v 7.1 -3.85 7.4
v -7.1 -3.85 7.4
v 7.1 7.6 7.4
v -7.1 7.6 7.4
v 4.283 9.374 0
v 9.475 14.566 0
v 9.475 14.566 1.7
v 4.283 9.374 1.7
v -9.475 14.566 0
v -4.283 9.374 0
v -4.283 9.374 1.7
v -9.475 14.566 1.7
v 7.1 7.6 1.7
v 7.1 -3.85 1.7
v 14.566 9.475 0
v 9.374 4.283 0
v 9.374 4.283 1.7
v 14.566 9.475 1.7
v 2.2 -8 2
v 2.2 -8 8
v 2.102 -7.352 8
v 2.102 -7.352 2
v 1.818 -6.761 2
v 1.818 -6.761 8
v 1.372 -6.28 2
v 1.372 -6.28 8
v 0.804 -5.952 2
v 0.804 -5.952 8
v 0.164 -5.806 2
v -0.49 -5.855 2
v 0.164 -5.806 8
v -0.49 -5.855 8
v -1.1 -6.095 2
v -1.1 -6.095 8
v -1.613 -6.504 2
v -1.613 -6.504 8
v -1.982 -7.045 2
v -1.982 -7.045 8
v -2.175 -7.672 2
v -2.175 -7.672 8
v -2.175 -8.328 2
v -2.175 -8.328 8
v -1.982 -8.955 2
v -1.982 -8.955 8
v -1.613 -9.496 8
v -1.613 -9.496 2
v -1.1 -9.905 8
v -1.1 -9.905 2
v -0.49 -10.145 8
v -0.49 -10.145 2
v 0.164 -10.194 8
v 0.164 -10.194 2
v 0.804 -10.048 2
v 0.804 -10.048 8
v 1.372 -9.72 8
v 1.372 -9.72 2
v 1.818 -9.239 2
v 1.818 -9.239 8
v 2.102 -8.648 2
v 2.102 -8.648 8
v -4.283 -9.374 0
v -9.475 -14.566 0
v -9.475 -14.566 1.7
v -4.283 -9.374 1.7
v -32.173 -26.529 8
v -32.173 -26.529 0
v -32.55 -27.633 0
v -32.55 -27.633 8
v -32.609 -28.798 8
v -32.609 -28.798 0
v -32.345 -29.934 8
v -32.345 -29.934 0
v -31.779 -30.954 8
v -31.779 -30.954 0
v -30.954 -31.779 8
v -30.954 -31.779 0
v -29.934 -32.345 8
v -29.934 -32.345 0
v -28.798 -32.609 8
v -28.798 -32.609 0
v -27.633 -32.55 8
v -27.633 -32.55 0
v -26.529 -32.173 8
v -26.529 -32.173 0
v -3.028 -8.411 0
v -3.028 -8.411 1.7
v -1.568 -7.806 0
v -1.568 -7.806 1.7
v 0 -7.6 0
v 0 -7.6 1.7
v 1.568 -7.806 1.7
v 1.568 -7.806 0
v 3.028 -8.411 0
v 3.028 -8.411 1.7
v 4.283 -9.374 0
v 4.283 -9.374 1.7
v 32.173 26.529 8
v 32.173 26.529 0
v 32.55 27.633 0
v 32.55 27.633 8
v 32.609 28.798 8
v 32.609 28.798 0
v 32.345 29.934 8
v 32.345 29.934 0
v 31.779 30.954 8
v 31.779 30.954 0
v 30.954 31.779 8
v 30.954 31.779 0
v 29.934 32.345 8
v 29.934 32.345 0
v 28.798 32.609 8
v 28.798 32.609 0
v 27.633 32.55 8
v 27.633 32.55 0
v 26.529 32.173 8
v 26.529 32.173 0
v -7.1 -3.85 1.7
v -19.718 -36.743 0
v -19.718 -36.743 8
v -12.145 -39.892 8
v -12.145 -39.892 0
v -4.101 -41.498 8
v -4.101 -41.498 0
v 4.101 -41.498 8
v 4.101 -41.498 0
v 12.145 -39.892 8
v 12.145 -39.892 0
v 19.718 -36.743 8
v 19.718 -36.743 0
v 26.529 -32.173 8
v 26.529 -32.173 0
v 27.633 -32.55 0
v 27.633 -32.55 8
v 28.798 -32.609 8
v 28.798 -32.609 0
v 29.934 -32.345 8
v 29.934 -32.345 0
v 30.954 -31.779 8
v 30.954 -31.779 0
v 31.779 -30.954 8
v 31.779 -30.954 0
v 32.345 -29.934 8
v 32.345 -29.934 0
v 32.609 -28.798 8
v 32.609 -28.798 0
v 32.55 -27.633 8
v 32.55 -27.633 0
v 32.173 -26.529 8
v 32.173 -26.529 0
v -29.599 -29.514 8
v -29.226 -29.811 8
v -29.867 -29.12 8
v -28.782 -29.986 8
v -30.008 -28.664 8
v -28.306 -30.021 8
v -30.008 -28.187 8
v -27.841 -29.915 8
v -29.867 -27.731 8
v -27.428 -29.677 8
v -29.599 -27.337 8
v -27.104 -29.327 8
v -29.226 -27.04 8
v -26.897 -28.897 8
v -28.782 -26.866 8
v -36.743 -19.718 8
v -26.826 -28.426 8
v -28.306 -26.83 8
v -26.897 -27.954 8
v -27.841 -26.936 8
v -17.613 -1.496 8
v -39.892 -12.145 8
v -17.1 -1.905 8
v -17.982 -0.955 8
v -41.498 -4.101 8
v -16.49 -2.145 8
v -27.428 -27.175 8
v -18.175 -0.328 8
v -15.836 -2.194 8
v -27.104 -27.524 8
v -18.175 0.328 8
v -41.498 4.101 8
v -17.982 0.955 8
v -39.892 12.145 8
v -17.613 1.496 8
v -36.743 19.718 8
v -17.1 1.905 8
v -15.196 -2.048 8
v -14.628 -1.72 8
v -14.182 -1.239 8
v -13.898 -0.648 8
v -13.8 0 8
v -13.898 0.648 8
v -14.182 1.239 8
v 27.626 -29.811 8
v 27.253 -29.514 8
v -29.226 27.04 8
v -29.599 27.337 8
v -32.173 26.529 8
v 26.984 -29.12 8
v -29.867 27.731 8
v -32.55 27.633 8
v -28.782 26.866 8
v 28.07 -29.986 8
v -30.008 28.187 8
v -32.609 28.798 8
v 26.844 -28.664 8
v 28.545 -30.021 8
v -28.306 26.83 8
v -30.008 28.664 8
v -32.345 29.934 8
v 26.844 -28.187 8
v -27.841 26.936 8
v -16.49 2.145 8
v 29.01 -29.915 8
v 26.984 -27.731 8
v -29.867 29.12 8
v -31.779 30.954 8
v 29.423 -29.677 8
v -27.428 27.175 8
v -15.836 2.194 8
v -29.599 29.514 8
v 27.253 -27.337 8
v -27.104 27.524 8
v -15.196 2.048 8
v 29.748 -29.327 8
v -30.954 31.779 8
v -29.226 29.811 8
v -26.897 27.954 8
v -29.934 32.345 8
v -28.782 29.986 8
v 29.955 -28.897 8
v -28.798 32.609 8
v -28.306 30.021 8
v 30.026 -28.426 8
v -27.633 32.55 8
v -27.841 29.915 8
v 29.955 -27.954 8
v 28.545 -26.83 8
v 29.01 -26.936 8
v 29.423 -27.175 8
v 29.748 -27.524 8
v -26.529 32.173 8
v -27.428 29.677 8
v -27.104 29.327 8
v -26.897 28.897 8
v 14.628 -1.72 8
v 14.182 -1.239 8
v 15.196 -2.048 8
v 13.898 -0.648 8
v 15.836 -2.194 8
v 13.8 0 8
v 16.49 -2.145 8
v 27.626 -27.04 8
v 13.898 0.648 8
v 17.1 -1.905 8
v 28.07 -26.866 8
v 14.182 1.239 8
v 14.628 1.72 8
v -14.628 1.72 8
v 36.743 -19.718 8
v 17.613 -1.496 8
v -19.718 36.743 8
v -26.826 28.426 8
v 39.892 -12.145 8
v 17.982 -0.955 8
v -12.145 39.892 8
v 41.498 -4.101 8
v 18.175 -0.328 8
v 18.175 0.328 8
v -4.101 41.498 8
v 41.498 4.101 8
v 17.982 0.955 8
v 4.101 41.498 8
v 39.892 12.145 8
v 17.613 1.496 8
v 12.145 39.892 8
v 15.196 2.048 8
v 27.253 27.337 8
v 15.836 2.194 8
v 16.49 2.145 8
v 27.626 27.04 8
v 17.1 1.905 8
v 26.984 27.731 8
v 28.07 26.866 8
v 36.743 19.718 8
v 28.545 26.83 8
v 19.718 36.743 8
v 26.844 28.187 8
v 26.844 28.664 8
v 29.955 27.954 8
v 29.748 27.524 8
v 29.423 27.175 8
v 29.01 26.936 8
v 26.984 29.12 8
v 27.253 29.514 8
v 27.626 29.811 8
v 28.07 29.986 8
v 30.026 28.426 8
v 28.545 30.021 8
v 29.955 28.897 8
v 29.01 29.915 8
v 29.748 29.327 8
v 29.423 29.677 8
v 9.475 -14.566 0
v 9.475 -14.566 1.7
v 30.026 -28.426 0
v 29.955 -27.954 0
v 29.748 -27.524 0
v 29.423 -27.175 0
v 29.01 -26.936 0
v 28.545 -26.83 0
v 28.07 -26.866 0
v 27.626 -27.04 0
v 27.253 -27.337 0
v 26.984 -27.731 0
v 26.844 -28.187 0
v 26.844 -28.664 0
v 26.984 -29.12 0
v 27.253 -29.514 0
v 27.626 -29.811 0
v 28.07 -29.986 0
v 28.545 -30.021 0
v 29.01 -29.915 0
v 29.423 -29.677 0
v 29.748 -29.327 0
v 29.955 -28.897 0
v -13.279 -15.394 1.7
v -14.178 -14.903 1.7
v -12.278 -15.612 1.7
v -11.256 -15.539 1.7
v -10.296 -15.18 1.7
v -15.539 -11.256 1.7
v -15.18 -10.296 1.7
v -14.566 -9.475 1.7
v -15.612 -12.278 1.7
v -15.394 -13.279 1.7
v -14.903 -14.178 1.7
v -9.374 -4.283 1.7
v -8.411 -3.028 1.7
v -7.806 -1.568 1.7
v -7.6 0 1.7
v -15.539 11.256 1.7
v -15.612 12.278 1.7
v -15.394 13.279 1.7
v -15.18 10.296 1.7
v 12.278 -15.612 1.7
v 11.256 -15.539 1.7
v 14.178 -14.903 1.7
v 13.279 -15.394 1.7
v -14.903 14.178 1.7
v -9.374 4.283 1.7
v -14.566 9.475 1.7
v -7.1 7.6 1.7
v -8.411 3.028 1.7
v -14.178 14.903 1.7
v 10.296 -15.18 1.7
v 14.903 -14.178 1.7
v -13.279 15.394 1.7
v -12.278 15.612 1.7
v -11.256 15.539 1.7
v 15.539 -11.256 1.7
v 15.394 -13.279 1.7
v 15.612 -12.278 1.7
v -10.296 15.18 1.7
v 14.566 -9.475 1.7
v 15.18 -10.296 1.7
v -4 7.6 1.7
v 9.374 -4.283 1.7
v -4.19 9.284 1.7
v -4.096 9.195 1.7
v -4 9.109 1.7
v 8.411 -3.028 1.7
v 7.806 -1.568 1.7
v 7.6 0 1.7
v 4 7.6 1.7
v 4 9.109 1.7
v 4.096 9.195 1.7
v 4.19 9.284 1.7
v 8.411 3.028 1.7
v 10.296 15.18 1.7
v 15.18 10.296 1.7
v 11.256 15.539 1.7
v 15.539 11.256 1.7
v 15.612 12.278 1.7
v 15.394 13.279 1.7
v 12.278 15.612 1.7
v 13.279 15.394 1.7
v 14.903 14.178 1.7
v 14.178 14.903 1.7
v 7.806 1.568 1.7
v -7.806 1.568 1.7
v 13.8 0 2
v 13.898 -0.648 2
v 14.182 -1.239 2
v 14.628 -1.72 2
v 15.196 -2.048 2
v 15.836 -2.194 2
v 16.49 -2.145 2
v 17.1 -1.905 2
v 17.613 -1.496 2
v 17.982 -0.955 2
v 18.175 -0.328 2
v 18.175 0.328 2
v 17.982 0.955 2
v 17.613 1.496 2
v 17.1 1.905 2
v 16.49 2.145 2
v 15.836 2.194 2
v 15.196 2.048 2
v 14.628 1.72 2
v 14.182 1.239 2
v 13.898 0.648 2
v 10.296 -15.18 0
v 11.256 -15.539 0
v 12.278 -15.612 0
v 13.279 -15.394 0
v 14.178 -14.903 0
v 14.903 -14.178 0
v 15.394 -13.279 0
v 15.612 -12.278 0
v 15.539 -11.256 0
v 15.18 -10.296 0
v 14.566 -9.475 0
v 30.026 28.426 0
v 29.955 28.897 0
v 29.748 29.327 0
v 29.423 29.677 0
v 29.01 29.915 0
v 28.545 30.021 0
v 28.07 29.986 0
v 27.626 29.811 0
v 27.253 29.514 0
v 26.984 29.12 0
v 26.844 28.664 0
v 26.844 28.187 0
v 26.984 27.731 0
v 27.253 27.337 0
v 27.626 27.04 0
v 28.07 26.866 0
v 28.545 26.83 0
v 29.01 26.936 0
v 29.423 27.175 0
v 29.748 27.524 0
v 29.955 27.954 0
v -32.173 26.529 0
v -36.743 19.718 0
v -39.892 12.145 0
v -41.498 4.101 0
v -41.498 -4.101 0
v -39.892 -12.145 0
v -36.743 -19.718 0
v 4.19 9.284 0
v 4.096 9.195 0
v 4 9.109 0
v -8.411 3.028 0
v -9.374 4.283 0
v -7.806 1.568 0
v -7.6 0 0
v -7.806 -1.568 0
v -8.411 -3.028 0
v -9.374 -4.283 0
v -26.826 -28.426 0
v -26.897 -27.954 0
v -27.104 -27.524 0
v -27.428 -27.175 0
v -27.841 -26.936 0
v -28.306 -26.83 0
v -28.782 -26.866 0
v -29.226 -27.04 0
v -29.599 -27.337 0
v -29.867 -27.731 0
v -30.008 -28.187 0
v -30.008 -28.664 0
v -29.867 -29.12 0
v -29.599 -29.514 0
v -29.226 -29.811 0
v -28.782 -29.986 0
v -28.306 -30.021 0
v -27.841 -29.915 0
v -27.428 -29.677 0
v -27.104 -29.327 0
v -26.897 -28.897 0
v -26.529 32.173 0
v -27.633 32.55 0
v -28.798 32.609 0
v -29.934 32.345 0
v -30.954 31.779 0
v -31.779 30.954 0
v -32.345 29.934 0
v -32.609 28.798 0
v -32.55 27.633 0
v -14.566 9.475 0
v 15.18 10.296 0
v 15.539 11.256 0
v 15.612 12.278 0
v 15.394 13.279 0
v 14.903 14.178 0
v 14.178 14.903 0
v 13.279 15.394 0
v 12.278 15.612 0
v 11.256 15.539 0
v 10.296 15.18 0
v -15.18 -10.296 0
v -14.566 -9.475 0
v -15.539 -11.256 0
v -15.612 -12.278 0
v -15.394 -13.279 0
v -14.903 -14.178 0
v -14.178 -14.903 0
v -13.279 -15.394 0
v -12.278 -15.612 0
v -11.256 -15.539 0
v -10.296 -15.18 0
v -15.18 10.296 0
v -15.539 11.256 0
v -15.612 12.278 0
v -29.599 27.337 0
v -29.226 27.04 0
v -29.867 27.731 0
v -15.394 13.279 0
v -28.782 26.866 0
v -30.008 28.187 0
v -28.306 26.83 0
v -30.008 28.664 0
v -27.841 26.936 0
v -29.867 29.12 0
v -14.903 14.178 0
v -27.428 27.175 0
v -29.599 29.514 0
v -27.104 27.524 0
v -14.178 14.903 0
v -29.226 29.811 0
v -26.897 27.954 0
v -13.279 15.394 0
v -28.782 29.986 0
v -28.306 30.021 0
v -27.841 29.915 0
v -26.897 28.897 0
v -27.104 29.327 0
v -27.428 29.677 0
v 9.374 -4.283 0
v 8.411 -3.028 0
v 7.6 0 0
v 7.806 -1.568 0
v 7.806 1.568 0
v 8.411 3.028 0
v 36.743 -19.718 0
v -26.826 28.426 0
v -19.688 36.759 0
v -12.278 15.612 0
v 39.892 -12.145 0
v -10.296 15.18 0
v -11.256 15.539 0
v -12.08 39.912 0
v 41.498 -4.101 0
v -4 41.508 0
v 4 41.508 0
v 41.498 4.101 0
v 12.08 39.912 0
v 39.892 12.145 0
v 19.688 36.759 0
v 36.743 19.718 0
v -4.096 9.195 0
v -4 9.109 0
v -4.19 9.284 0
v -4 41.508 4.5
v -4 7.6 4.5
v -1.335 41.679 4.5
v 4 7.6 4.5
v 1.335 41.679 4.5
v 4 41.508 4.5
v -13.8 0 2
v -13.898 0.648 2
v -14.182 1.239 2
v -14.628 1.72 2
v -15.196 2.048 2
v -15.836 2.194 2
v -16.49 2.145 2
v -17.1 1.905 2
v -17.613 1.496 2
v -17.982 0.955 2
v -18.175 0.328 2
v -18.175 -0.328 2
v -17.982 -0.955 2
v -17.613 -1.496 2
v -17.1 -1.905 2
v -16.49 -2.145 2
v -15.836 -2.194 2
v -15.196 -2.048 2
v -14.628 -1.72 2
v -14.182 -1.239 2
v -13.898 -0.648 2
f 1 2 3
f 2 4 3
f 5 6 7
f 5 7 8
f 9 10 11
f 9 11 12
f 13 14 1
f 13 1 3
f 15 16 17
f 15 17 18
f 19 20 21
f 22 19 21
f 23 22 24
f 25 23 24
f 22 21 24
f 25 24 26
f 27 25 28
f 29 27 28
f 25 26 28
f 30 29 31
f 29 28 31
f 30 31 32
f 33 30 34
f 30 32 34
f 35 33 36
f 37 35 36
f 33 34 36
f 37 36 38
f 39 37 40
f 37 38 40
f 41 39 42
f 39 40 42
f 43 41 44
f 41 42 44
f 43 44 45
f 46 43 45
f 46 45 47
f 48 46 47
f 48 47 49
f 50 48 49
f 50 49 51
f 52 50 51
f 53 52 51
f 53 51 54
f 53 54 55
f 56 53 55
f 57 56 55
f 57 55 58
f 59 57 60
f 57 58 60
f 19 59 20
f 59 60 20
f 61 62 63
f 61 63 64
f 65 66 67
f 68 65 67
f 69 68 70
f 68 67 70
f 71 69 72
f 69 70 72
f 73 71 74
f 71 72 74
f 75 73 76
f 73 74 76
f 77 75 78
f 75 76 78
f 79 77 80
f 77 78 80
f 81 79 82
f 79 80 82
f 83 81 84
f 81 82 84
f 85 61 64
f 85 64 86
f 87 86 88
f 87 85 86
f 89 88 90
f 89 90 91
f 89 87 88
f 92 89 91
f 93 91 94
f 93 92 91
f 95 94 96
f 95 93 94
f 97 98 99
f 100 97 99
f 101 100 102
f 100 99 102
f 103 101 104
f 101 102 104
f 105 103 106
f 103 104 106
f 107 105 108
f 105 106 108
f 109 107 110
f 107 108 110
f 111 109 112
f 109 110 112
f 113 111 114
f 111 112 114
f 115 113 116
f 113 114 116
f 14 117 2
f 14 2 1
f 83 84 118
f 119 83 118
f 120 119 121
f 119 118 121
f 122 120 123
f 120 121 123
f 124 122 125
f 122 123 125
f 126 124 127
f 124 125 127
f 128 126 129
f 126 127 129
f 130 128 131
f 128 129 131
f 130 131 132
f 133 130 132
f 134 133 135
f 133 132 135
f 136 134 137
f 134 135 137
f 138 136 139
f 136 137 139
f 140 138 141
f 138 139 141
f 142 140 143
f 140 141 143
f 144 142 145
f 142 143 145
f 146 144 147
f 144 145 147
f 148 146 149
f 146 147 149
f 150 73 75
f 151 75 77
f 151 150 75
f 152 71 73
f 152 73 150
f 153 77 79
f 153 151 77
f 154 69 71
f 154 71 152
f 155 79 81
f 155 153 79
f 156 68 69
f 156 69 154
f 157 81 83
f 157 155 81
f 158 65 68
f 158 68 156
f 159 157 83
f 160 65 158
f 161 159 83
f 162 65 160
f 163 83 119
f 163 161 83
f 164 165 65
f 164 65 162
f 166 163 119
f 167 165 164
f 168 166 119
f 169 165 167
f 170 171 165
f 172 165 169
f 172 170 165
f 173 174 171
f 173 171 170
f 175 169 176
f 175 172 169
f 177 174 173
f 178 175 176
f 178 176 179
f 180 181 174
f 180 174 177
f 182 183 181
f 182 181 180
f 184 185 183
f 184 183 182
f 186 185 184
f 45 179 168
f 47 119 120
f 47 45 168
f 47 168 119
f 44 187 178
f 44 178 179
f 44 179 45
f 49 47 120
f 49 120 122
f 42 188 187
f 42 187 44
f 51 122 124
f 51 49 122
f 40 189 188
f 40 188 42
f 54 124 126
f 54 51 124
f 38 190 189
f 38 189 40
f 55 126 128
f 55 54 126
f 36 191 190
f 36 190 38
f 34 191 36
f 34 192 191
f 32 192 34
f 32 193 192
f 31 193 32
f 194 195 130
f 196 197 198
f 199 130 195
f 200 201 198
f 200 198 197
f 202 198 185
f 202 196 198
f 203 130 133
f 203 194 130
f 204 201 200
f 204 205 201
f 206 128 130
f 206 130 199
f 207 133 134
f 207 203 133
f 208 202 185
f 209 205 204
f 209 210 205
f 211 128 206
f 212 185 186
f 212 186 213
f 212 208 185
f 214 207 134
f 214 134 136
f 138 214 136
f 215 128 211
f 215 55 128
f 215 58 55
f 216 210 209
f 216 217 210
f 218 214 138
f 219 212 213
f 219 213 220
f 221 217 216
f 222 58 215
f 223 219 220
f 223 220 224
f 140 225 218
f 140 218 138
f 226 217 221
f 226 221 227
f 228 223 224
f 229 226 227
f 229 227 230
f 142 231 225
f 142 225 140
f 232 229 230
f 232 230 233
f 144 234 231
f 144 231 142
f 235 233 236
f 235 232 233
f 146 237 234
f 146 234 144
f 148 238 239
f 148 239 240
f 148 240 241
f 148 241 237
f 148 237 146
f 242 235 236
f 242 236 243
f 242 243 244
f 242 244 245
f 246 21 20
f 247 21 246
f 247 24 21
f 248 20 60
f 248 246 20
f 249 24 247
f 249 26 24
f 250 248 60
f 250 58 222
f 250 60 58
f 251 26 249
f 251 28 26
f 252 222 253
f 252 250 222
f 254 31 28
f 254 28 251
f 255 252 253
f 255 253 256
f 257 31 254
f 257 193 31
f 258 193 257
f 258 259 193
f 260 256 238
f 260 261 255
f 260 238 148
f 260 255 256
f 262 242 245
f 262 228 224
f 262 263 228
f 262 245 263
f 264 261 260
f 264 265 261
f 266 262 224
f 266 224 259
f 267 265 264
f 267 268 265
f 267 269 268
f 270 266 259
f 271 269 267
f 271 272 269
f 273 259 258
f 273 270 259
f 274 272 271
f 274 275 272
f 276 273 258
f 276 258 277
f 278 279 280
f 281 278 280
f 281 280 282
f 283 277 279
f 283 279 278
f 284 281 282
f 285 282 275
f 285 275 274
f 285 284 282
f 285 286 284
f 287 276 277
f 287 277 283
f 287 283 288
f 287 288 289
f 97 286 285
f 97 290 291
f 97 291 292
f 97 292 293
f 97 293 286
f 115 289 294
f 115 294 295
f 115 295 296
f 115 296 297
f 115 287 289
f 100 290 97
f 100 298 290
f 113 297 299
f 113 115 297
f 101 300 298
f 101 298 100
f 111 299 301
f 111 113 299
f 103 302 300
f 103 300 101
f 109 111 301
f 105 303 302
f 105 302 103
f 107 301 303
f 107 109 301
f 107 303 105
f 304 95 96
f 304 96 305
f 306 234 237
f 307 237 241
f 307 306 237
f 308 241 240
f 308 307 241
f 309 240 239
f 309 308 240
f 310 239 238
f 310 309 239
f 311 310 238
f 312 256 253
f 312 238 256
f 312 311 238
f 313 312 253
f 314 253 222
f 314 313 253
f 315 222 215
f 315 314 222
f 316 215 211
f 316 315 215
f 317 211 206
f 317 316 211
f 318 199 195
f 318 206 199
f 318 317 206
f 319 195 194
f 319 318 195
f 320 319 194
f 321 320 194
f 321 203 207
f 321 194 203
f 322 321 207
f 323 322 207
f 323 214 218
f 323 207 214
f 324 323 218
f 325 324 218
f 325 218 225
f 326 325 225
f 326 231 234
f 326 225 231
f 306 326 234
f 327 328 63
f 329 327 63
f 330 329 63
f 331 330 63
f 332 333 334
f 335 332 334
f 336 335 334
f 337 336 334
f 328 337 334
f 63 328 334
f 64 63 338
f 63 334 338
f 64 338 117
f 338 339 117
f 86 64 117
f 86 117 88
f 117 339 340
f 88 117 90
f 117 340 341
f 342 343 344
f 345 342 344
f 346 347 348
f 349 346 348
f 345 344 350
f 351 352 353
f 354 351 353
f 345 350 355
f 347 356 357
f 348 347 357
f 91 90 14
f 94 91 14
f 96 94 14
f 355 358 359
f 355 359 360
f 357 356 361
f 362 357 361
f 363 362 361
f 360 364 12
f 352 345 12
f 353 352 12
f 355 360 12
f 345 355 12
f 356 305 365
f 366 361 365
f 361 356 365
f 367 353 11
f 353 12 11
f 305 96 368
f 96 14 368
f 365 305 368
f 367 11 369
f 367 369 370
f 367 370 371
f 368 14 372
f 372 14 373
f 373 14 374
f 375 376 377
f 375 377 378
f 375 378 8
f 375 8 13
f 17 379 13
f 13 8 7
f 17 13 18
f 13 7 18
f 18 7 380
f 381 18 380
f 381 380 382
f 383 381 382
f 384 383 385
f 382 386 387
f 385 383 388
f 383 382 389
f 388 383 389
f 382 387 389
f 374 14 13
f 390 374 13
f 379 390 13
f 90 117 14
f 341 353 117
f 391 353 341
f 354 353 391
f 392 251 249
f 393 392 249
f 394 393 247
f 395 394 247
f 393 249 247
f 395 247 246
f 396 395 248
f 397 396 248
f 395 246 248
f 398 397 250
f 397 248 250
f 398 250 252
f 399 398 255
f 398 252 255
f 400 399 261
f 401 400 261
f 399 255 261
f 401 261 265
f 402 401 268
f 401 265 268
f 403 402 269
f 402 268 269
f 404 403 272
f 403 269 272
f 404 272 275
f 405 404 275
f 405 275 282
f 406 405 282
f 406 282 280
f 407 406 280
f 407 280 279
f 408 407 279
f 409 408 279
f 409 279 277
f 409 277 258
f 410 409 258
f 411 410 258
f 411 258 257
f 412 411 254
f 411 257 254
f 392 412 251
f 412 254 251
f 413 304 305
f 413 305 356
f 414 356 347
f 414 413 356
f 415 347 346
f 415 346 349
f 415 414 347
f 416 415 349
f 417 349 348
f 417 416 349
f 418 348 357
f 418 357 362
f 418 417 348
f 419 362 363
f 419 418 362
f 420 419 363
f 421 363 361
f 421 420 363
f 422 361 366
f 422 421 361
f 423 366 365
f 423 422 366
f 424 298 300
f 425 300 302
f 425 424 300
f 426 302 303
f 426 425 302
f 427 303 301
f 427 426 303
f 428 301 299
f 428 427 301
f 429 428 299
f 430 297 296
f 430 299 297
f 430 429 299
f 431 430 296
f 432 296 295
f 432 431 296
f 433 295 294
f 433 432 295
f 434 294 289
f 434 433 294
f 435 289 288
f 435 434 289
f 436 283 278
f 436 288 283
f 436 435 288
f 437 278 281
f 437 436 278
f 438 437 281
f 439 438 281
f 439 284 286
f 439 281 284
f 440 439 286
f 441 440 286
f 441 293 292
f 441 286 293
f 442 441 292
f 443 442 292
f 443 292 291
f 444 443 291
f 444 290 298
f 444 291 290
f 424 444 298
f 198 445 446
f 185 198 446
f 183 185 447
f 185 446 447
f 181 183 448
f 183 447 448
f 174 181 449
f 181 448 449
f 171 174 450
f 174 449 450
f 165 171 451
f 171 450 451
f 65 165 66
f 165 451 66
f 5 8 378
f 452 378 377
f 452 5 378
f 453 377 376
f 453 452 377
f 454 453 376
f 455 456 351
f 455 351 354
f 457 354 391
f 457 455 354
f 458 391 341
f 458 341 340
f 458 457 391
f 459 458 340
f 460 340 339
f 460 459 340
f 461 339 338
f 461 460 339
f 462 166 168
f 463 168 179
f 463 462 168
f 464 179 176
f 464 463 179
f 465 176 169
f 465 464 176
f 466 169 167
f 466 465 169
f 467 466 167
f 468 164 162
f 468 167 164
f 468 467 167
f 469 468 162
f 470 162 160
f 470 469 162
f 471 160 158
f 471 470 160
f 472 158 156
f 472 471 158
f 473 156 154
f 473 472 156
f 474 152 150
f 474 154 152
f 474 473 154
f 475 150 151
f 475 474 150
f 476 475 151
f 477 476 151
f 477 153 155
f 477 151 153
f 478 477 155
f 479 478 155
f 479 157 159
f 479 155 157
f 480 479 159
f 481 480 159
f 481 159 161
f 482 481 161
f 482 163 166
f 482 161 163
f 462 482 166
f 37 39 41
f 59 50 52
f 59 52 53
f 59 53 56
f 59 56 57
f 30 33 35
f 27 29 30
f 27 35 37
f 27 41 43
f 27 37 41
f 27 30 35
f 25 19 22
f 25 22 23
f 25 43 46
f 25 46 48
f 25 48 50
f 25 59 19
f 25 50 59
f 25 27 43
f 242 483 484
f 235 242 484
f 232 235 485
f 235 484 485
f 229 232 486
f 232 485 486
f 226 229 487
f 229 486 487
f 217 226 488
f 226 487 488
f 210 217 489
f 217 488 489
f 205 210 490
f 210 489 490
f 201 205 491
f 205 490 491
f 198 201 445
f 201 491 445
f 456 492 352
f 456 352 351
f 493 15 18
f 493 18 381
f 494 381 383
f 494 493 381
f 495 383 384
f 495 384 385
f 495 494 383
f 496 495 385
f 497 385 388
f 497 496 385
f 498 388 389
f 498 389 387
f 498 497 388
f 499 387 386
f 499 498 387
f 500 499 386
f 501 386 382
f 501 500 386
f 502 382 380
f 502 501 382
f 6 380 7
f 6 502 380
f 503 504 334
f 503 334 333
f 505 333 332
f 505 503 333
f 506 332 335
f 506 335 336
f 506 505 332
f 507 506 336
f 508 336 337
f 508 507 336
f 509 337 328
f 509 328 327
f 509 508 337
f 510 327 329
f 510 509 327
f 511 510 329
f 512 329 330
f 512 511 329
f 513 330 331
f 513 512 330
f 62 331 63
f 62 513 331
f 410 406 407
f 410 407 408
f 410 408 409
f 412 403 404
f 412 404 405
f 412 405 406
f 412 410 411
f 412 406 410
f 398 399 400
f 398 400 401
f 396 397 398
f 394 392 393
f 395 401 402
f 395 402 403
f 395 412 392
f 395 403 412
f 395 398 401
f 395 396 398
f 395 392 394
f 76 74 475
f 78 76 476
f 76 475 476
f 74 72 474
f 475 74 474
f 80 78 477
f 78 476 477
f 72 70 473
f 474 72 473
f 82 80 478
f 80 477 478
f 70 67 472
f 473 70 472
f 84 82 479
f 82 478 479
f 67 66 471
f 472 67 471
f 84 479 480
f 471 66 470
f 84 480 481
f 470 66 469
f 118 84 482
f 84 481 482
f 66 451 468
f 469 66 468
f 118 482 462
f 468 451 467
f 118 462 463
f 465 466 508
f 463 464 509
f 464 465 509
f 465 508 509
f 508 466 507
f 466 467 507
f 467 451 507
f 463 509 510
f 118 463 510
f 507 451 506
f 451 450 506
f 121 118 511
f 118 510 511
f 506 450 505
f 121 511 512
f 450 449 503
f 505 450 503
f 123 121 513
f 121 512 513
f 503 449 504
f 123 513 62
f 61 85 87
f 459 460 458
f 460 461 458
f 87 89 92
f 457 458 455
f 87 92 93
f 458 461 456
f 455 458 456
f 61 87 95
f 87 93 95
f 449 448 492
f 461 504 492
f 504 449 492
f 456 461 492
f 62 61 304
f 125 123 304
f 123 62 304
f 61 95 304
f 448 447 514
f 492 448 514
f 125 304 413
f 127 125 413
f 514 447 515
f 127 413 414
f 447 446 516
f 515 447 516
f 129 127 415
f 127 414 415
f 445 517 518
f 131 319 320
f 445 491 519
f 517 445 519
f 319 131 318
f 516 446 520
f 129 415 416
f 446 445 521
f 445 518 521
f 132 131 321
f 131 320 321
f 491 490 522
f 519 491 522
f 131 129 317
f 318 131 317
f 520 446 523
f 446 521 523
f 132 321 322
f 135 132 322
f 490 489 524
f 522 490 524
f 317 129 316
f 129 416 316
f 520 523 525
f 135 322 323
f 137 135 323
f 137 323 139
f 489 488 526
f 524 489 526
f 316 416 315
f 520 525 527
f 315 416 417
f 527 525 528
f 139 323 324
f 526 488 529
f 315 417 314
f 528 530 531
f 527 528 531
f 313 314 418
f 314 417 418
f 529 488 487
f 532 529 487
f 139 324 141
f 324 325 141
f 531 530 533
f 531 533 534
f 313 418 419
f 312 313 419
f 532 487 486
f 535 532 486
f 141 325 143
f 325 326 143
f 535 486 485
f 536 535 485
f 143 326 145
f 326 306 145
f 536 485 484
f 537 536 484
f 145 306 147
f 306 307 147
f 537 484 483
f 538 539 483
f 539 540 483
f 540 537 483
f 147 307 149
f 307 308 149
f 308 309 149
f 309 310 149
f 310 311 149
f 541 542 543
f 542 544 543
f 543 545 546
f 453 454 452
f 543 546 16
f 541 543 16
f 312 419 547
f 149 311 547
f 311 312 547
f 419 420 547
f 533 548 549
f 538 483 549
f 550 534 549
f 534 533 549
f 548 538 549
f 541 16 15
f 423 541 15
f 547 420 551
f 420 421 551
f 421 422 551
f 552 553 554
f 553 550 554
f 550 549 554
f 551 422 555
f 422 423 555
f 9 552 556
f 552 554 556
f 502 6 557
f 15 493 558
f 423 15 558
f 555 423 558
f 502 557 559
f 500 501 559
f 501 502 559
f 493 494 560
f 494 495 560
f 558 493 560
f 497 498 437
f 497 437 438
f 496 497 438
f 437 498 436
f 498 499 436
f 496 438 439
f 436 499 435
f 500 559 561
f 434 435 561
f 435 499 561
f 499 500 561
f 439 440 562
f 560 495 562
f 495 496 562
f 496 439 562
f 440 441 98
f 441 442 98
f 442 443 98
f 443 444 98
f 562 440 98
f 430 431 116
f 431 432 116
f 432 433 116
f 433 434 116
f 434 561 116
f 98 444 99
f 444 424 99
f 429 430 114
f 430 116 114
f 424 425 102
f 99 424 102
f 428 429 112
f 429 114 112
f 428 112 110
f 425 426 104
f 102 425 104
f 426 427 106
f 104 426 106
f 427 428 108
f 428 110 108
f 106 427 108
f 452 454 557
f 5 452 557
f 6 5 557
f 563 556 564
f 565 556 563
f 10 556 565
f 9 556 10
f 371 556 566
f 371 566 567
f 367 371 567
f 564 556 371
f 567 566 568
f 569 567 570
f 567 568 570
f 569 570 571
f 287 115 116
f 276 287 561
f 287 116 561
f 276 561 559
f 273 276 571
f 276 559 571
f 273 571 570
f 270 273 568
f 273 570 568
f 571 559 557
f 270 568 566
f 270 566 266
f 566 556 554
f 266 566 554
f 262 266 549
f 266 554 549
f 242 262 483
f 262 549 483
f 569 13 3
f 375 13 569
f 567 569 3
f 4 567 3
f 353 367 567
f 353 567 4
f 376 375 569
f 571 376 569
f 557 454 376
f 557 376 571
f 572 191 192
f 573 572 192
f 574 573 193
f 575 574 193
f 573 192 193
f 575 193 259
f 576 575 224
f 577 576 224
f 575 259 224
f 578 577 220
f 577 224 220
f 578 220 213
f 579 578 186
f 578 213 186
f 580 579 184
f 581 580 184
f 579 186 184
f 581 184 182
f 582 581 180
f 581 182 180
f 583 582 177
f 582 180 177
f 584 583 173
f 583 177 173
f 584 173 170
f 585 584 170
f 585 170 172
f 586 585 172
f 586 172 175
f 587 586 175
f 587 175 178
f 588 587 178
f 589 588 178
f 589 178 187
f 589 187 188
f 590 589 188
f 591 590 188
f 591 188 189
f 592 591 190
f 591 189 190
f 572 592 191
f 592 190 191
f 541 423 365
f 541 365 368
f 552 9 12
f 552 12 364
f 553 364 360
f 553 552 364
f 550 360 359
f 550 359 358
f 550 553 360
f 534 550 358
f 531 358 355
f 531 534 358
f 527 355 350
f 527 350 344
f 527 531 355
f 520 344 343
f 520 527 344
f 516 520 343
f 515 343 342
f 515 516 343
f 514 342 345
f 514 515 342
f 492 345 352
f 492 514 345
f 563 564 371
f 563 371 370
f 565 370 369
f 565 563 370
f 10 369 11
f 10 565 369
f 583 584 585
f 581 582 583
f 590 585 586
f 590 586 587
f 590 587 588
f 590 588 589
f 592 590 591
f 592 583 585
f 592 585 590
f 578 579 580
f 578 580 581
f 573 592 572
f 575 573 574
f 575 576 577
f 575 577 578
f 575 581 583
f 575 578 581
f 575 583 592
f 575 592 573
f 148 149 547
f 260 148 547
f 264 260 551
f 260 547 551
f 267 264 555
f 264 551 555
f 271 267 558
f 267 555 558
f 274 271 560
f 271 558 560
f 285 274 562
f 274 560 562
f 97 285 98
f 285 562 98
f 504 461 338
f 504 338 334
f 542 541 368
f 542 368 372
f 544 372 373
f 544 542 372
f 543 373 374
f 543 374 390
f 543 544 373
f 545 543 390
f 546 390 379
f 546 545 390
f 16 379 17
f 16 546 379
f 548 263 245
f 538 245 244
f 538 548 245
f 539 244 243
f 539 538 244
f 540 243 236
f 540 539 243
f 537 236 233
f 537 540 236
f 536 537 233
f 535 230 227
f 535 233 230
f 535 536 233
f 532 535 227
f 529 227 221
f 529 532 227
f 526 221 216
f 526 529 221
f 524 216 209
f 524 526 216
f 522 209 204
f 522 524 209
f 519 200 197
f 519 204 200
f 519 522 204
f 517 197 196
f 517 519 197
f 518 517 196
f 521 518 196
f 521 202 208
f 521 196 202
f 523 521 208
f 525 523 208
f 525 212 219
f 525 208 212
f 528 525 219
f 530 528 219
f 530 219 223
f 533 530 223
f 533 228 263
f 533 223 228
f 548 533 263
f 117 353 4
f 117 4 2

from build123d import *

# Parameters (mm, degrees)
BOSS_EXTRUDE1_DEPTH = 8
CUT_EXTRUDE4_DEPTH  = 1.7
CUT_EXTRUDE5_DEPTH  = 7.4
CUT_EXTRUDE6_DEPTH  = 4.5
SKETCH3_R           = 2.2
CUT_EXTRUDE7_DEPTH  = 6
SKETCH1_10_R        = 1.6
CUT_EXTRUDE8_DEPTH  = 60.512855754


with BuildPart() as part:
    # Sketch1 → Boss-Extrude1 (new body)
    with BuildSketch(Plane.XY):
        with BuildLine():
            ThreePointArc((-32.17302157, 26.528978176), (-41.7, 0), (-32.17302157, -26.528978176))
            ThreePointArc((-32.17302157, -26.528978176), (-31.395541085, -31.395541085), (-26.528978176, -32.17302157))
            ThreePointArc((-26.528978176, -32.17302157), (0, -41.7), (26.528978176, -32.17302157))
            ThreePointArc((26.528978176, -32.17302157), (31.395541085, -31.395541085), (32.17302157, -26.528978176))
            ThreePointArc((32.17302157, -26.528978176), (41.7, 0), (32.17302157, 26.528978176))
            ThreePointArc((32.17302157, 26.528978176), (31.395541085, 31.395541085), (26.528978176, 32.17302157))
            ThreePointArc((26.528978176, 32.17302157), (0, 41.7), (-26.528978176, 32.17302157))
            ThreePointArc((-26.528978176, 32.17302157), (-31.395541085, 31.395541085), (-32.17302157, 26.528978176))
        make_face()
    extrude(amount=BOSS_EXTRUDE1_DEPTH)

    # Sketch1<7> → Cut-Extrude4 (cut)
    with BuildSketch(Plane.XY):
        with BuildLine():
            Line((-4.282842712, 9.374011537), (-9.475230868, 14.566399692))
            ThreePointArc((-9.475230868, 14.566399692), (-14.566399692, 14.566399692), (-14.566399692, 9.475230868))
            Line((-14.566399692, 9.475230868), (-9.374011537, 4.282842712))
            ThreePointArc((-9.374011537, 4.282842712), (-7.6, 0), (-9.374011537, -4.282842712))
            Line((-9.374011537, -4.282842712), (-14.566399692, -9.475230868))
            ThreePointArc((-14.566399692, -9.475230868), (-14.566399692, -14.566399692), (-9.475230868, -14.566399692))
            Line((-9.475230868, -14.566399692), (-4.282842712, -9.374011537))
            ThreePointArc((-4.282842712, -9.374011537), (0, -7.6), (4.282842712, -9.374011537))
            Line((4.282842712, -9.374011537), (9.475230868, -14.566399692))
            ThreePointArc((9.475230868, -14.566399692), (14.566399692, -14.566399692), (14.566399692, -9.475230868))
            Line((14.566399692, -9.475230868), (9.374011537, -4.282842712))
            ThreePointArc((9.374011537, -4.282842712), (7.6, 0), (9.374011537, 4.282842712))
            Line((9.374011537, 4.282842712), (14.566399692, 9.475230868))
            ThreePointArc((14.566399692, 9.475230868), (14.566399692, 14.566399692), (9.475230868, 14.566399692))
            Line((9.475230868, 14.566399692), (4.282842712, 9.374011537))
            ThreePointArc((4.282842712, 9.374011537), (0, 7.6), (-4.282842712, 9.374011537))
        make_face()
    extrude(amount=CUT_EXTRUDE4_DEPTH, mode=Mode.SUBTRACT)

    # Sketch1<8> → Cut-Extrude5 (cut)
    with BuildSketch(Plane.XY):
        Polygon((-7.1, -3.85), (7.1, -3.85), (7.1, 3.85), (7.1, 7.6), (-7.1, 7.6), (-7.1, 3.85), align=None)
    extrude(amount=CUT_EXTRUDE5_DEPTH, mode=Mode.SUBTRACT)

    # Sketch1<9> → Cut-Extrude6 (cut)
    with BuildSketch(Plane.XY):
        with BuildLine():
            Line((-4, 7.6), (4, 7.6))
            Line((4, 7.6), (4, 41.507710127))
            ThreePointArc((4, 41.507710127), (0, 41.7), (-4, 41.507710127))
            Line((-4, 41.507710127), (-4, 7.6))
        make_face()
    extrude(amount=CUT_EXTRUDE6_DEPTH, mode=Mode.SUBTRACT)

    # Sketch3 → Cut-Extrude7 (cut)
    with BuildSketch(Plane.XY.offset(8)):
        with Locations((-16, 0)):
            Circle(SKETCH3_R)
        with Locations((16, 0)):
            Circle(SKETCH3_R)
        with Locations((0, -8)):
            Circle(SKETCH3_R)
    extrude(amount=-CUT_EXTRUDE7_DEPTH, mode=Mode.SUBTRACT)

    # Sketch1<10> → Cut-Extrude8 (cut, through all)
    with BuildSketch(Plane.XY):
        with Locations((-28.425692604, 28.425692604)):
            Circle(SKETCH1_10_R)
        with Locations((28.425692604, 28.425692604)):
            Circle(SKETCH1_10_R)
        with Locations((28.425692604, -28.425692604)):
            Circle(SKETCH1_10_R)
        with Locations((-28.425692604, -28.425692604)):
            Circle(SKETCH1_10_R)
    extrude(amount=CUT_EXTRUDE8_DEPTH, mode=Mode.SUBTRACT)


solid = part.part
